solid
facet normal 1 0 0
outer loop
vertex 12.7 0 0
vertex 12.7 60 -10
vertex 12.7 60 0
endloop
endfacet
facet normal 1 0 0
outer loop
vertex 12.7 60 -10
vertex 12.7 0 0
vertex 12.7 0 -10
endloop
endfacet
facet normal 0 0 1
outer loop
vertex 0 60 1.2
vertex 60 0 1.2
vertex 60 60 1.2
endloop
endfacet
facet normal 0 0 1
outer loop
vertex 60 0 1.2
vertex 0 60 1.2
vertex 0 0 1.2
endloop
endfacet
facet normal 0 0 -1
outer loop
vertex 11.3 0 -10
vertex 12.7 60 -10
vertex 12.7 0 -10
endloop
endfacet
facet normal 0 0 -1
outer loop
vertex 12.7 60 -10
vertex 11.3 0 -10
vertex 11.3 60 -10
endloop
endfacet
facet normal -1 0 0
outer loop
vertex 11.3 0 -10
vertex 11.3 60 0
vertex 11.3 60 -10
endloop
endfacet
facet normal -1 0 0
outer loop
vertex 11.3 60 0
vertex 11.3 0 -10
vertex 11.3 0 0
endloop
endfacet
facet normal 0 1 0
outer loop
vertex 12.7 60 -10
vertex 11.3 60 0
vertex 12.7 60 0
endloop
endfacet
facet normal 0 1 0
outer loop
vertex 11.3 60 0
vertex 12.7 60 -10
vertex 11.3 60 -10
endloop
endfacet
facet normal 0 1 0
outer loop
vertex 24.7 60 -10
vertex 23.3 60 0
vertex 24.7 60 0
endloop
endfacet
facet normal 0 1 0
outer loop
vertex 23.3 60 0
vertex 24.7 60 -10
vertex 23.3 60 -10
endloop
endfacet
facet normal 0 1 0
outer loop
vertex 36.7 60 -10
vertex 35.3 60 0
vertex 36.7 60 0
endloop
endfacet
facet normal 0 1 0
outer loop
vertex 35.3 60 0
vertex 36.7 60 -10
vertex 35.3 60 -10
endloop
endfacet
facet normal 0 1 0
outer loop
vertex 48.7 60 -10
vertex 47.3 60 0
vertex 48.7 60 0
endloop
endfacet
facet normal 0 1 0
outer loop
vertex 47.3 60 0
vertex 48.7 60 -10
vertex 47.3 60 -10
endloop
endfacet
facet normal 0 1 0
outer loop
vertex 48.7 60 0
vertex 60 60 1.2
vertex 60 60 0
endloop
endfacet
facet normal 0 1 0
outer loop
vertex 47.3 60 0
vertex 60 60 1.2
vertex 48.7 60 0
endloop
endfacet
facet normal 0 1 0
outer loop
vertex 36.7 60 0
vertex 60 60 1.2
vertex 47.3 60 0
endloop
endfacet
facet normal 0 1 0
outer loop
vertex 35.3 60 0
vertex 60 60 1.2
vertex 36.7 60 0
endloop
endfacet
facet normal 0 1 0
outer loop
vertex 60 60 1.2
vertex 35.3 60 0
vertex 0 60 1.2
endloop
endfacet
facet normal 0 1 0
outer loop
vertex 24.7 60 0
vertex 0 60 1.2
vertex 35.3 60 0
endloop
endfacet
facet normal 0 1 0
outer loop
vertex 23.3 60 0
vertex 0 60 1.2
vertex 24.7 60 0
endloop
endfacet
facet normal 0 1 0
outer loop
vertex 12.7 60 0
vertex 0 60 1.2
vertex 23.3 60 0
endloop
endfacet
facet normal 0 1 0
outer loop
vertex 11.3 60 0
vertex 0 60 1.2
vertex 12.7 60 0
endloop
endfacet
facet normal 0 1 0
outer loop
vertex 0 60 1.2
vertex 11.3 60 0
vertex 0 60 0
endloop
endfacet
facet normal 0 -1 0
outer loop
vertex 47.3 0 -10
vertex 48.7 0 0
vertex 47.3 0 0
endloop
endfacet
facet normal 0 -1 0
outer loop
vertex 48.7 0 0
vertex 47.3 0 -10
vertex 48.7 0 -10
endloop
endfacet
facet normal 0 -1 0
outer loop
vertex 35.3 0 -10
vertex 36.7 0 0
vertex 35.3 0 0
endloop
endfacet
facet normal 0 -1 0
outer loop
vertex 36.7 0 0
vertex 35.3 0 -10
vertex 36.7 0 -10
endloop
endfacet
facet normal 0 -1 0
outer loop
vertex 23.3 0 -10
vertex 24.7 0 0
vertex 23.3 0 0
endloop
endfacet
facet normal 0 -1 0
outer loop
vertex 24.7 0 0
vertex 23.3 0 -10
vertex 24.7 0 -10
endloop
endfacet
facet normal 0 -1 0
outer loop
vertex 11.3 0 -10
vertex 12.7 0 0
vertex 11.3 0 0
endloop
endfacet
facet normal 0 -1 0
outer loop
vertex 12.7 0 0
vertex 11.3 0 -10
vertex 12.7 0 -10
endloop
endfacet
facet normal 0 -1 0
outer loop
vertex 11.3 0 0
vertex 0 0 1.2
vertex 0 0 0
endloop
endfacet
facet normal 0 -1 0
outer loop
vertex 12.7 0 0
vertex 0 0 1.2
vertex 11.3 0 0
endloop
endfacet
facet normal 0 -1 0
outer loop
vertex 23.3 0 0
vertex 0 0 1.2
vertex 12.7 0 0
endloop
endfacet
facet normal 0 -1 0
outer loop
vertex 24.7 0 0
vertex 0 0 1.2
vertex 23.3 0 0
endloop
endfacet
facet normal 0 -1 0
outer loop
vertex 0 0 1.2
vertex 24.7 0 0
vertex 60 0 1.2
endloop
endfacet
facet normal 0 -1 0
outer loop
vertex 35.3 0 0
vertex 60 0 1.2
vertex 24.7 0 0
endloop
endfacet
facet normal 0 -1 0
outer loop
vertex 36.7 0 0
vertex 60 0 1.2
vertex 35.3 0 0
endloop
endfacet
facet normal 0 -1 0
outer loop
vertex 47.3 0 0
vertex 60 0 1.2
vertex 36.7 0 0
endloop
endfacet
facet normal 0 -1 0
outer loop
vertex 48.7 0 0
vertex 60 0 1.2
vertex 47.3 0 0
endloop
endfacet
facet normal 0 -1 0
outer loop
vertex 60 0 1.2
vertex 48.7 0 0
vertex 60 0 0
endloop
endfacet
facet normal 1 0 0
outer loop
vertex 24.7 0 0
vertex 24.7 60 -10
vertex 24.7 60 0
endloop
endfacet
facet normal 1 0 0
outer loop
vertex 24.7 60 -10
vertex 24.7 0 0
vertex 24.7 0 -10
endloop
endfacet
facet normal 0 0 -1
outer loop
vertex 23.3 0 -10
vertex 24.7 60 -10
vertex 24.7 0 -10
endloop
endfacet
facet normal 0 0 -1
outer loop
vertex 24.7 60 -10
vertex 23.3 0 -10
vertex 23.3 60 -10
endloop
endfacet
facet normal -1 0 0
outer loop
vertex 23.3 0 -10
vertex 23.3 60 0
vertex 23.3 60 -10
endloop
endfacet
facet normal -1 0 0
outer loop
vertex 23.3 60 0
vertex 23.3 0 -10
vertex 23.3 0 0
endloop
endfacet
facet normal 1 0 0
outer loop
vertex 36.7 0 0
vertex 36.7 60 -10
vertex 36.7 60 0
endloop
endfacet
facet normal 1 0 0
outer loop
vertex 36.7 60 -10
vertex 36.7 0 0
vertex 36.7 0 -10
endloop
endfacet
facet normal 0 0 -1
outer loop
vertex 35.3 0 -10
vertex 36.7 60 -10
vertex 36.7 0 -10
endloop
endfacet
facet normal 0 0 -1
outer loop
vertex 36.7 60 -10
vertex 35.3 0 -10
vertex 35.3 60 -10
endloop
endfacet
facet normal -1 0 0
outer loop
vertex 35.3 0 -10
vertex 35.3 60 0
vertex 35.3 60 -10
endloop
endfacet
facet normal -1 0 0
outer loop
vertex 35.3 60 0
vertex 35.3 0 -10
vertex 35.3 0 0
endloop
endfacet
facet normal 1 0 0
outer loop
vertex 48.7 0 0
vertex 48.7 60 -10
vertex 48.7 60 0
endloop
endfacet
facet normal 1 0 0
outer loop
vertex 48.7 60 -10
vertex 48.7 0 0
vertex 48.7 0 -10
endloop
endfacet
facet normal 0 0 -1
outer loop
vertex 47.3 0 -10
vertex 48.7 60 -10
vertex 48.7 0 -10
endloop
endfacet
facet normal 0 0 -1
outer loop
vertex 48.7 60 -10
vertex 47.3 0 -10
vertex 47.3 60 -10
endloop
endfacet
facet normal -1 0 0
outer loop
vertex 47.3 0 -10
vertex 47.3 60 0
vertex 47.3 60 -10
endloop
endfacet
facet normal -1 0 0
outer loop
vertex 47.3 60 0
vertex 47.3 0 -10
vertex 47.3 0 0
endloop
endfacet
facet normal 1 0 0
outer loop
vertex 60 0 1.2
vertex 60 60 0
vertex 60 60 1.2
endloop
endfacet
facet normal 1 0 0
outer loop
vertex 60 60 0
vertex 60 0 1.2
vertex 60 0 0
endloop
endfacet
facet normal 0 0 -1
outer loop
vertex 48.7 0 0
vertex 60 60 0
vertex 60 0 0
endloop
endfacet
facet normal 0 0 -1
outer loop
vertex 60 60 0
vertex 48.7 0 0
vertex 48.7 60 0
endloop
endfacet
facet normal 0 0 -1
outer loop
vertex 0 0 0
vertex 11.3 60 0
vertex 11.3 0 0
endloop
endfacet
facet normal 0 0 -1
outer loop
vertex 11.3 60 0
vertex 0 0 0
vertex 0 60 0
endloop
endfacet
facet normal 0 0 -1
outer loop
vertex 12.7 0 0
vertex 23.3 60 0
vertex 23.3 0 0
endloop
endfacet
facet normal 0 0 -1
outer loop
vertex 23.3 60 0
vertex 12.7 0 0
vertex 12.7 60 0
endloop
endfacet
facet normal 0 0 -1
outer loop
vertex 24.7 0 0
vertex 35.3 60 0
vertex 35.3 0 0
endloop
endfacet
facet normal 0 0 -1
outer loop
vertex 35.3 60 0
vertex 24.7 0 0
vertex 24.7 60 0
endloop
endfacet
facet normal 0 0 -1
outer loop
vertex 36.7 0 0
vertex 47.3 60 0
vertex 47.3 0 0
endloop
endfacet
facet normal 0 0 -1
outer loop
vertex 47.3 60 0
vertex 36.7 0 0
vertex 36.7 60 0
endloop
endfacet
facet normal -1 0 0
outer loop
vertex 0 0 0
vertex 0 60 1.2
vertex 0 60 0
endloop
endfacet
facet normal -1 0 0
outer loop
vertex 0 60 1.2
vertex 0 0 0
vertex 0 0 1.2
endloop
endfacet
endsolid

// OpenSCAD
$fn = 32;

// ----------------------------------------------------------------------
// Ribbed panel: 1.2 mm panel
// ----------------------------------------------------------------------

// --- parameters (mm) ---
panel_l = 60;             // panel length, X
panel_w = 60;             // panel width, Y
panel_t = 1.2;            // panel thickness, Z
rib_t = 1.4;              // rib thickness
rib_h = 10;               // rib height below the panel
ribs = 4;                 // number of ribs

total_h = panel_t + rib_h;  // overall height

union() {
  cube([panel_l, panel_w, panel_t]);
  for (i = [1 : ribs])
    translate([i * panel_l / (ribs + 1) - rib_t / 2, 0, -rib_h])
      cube([rib_t, panel_w, rib_h + panel_t]);
}
